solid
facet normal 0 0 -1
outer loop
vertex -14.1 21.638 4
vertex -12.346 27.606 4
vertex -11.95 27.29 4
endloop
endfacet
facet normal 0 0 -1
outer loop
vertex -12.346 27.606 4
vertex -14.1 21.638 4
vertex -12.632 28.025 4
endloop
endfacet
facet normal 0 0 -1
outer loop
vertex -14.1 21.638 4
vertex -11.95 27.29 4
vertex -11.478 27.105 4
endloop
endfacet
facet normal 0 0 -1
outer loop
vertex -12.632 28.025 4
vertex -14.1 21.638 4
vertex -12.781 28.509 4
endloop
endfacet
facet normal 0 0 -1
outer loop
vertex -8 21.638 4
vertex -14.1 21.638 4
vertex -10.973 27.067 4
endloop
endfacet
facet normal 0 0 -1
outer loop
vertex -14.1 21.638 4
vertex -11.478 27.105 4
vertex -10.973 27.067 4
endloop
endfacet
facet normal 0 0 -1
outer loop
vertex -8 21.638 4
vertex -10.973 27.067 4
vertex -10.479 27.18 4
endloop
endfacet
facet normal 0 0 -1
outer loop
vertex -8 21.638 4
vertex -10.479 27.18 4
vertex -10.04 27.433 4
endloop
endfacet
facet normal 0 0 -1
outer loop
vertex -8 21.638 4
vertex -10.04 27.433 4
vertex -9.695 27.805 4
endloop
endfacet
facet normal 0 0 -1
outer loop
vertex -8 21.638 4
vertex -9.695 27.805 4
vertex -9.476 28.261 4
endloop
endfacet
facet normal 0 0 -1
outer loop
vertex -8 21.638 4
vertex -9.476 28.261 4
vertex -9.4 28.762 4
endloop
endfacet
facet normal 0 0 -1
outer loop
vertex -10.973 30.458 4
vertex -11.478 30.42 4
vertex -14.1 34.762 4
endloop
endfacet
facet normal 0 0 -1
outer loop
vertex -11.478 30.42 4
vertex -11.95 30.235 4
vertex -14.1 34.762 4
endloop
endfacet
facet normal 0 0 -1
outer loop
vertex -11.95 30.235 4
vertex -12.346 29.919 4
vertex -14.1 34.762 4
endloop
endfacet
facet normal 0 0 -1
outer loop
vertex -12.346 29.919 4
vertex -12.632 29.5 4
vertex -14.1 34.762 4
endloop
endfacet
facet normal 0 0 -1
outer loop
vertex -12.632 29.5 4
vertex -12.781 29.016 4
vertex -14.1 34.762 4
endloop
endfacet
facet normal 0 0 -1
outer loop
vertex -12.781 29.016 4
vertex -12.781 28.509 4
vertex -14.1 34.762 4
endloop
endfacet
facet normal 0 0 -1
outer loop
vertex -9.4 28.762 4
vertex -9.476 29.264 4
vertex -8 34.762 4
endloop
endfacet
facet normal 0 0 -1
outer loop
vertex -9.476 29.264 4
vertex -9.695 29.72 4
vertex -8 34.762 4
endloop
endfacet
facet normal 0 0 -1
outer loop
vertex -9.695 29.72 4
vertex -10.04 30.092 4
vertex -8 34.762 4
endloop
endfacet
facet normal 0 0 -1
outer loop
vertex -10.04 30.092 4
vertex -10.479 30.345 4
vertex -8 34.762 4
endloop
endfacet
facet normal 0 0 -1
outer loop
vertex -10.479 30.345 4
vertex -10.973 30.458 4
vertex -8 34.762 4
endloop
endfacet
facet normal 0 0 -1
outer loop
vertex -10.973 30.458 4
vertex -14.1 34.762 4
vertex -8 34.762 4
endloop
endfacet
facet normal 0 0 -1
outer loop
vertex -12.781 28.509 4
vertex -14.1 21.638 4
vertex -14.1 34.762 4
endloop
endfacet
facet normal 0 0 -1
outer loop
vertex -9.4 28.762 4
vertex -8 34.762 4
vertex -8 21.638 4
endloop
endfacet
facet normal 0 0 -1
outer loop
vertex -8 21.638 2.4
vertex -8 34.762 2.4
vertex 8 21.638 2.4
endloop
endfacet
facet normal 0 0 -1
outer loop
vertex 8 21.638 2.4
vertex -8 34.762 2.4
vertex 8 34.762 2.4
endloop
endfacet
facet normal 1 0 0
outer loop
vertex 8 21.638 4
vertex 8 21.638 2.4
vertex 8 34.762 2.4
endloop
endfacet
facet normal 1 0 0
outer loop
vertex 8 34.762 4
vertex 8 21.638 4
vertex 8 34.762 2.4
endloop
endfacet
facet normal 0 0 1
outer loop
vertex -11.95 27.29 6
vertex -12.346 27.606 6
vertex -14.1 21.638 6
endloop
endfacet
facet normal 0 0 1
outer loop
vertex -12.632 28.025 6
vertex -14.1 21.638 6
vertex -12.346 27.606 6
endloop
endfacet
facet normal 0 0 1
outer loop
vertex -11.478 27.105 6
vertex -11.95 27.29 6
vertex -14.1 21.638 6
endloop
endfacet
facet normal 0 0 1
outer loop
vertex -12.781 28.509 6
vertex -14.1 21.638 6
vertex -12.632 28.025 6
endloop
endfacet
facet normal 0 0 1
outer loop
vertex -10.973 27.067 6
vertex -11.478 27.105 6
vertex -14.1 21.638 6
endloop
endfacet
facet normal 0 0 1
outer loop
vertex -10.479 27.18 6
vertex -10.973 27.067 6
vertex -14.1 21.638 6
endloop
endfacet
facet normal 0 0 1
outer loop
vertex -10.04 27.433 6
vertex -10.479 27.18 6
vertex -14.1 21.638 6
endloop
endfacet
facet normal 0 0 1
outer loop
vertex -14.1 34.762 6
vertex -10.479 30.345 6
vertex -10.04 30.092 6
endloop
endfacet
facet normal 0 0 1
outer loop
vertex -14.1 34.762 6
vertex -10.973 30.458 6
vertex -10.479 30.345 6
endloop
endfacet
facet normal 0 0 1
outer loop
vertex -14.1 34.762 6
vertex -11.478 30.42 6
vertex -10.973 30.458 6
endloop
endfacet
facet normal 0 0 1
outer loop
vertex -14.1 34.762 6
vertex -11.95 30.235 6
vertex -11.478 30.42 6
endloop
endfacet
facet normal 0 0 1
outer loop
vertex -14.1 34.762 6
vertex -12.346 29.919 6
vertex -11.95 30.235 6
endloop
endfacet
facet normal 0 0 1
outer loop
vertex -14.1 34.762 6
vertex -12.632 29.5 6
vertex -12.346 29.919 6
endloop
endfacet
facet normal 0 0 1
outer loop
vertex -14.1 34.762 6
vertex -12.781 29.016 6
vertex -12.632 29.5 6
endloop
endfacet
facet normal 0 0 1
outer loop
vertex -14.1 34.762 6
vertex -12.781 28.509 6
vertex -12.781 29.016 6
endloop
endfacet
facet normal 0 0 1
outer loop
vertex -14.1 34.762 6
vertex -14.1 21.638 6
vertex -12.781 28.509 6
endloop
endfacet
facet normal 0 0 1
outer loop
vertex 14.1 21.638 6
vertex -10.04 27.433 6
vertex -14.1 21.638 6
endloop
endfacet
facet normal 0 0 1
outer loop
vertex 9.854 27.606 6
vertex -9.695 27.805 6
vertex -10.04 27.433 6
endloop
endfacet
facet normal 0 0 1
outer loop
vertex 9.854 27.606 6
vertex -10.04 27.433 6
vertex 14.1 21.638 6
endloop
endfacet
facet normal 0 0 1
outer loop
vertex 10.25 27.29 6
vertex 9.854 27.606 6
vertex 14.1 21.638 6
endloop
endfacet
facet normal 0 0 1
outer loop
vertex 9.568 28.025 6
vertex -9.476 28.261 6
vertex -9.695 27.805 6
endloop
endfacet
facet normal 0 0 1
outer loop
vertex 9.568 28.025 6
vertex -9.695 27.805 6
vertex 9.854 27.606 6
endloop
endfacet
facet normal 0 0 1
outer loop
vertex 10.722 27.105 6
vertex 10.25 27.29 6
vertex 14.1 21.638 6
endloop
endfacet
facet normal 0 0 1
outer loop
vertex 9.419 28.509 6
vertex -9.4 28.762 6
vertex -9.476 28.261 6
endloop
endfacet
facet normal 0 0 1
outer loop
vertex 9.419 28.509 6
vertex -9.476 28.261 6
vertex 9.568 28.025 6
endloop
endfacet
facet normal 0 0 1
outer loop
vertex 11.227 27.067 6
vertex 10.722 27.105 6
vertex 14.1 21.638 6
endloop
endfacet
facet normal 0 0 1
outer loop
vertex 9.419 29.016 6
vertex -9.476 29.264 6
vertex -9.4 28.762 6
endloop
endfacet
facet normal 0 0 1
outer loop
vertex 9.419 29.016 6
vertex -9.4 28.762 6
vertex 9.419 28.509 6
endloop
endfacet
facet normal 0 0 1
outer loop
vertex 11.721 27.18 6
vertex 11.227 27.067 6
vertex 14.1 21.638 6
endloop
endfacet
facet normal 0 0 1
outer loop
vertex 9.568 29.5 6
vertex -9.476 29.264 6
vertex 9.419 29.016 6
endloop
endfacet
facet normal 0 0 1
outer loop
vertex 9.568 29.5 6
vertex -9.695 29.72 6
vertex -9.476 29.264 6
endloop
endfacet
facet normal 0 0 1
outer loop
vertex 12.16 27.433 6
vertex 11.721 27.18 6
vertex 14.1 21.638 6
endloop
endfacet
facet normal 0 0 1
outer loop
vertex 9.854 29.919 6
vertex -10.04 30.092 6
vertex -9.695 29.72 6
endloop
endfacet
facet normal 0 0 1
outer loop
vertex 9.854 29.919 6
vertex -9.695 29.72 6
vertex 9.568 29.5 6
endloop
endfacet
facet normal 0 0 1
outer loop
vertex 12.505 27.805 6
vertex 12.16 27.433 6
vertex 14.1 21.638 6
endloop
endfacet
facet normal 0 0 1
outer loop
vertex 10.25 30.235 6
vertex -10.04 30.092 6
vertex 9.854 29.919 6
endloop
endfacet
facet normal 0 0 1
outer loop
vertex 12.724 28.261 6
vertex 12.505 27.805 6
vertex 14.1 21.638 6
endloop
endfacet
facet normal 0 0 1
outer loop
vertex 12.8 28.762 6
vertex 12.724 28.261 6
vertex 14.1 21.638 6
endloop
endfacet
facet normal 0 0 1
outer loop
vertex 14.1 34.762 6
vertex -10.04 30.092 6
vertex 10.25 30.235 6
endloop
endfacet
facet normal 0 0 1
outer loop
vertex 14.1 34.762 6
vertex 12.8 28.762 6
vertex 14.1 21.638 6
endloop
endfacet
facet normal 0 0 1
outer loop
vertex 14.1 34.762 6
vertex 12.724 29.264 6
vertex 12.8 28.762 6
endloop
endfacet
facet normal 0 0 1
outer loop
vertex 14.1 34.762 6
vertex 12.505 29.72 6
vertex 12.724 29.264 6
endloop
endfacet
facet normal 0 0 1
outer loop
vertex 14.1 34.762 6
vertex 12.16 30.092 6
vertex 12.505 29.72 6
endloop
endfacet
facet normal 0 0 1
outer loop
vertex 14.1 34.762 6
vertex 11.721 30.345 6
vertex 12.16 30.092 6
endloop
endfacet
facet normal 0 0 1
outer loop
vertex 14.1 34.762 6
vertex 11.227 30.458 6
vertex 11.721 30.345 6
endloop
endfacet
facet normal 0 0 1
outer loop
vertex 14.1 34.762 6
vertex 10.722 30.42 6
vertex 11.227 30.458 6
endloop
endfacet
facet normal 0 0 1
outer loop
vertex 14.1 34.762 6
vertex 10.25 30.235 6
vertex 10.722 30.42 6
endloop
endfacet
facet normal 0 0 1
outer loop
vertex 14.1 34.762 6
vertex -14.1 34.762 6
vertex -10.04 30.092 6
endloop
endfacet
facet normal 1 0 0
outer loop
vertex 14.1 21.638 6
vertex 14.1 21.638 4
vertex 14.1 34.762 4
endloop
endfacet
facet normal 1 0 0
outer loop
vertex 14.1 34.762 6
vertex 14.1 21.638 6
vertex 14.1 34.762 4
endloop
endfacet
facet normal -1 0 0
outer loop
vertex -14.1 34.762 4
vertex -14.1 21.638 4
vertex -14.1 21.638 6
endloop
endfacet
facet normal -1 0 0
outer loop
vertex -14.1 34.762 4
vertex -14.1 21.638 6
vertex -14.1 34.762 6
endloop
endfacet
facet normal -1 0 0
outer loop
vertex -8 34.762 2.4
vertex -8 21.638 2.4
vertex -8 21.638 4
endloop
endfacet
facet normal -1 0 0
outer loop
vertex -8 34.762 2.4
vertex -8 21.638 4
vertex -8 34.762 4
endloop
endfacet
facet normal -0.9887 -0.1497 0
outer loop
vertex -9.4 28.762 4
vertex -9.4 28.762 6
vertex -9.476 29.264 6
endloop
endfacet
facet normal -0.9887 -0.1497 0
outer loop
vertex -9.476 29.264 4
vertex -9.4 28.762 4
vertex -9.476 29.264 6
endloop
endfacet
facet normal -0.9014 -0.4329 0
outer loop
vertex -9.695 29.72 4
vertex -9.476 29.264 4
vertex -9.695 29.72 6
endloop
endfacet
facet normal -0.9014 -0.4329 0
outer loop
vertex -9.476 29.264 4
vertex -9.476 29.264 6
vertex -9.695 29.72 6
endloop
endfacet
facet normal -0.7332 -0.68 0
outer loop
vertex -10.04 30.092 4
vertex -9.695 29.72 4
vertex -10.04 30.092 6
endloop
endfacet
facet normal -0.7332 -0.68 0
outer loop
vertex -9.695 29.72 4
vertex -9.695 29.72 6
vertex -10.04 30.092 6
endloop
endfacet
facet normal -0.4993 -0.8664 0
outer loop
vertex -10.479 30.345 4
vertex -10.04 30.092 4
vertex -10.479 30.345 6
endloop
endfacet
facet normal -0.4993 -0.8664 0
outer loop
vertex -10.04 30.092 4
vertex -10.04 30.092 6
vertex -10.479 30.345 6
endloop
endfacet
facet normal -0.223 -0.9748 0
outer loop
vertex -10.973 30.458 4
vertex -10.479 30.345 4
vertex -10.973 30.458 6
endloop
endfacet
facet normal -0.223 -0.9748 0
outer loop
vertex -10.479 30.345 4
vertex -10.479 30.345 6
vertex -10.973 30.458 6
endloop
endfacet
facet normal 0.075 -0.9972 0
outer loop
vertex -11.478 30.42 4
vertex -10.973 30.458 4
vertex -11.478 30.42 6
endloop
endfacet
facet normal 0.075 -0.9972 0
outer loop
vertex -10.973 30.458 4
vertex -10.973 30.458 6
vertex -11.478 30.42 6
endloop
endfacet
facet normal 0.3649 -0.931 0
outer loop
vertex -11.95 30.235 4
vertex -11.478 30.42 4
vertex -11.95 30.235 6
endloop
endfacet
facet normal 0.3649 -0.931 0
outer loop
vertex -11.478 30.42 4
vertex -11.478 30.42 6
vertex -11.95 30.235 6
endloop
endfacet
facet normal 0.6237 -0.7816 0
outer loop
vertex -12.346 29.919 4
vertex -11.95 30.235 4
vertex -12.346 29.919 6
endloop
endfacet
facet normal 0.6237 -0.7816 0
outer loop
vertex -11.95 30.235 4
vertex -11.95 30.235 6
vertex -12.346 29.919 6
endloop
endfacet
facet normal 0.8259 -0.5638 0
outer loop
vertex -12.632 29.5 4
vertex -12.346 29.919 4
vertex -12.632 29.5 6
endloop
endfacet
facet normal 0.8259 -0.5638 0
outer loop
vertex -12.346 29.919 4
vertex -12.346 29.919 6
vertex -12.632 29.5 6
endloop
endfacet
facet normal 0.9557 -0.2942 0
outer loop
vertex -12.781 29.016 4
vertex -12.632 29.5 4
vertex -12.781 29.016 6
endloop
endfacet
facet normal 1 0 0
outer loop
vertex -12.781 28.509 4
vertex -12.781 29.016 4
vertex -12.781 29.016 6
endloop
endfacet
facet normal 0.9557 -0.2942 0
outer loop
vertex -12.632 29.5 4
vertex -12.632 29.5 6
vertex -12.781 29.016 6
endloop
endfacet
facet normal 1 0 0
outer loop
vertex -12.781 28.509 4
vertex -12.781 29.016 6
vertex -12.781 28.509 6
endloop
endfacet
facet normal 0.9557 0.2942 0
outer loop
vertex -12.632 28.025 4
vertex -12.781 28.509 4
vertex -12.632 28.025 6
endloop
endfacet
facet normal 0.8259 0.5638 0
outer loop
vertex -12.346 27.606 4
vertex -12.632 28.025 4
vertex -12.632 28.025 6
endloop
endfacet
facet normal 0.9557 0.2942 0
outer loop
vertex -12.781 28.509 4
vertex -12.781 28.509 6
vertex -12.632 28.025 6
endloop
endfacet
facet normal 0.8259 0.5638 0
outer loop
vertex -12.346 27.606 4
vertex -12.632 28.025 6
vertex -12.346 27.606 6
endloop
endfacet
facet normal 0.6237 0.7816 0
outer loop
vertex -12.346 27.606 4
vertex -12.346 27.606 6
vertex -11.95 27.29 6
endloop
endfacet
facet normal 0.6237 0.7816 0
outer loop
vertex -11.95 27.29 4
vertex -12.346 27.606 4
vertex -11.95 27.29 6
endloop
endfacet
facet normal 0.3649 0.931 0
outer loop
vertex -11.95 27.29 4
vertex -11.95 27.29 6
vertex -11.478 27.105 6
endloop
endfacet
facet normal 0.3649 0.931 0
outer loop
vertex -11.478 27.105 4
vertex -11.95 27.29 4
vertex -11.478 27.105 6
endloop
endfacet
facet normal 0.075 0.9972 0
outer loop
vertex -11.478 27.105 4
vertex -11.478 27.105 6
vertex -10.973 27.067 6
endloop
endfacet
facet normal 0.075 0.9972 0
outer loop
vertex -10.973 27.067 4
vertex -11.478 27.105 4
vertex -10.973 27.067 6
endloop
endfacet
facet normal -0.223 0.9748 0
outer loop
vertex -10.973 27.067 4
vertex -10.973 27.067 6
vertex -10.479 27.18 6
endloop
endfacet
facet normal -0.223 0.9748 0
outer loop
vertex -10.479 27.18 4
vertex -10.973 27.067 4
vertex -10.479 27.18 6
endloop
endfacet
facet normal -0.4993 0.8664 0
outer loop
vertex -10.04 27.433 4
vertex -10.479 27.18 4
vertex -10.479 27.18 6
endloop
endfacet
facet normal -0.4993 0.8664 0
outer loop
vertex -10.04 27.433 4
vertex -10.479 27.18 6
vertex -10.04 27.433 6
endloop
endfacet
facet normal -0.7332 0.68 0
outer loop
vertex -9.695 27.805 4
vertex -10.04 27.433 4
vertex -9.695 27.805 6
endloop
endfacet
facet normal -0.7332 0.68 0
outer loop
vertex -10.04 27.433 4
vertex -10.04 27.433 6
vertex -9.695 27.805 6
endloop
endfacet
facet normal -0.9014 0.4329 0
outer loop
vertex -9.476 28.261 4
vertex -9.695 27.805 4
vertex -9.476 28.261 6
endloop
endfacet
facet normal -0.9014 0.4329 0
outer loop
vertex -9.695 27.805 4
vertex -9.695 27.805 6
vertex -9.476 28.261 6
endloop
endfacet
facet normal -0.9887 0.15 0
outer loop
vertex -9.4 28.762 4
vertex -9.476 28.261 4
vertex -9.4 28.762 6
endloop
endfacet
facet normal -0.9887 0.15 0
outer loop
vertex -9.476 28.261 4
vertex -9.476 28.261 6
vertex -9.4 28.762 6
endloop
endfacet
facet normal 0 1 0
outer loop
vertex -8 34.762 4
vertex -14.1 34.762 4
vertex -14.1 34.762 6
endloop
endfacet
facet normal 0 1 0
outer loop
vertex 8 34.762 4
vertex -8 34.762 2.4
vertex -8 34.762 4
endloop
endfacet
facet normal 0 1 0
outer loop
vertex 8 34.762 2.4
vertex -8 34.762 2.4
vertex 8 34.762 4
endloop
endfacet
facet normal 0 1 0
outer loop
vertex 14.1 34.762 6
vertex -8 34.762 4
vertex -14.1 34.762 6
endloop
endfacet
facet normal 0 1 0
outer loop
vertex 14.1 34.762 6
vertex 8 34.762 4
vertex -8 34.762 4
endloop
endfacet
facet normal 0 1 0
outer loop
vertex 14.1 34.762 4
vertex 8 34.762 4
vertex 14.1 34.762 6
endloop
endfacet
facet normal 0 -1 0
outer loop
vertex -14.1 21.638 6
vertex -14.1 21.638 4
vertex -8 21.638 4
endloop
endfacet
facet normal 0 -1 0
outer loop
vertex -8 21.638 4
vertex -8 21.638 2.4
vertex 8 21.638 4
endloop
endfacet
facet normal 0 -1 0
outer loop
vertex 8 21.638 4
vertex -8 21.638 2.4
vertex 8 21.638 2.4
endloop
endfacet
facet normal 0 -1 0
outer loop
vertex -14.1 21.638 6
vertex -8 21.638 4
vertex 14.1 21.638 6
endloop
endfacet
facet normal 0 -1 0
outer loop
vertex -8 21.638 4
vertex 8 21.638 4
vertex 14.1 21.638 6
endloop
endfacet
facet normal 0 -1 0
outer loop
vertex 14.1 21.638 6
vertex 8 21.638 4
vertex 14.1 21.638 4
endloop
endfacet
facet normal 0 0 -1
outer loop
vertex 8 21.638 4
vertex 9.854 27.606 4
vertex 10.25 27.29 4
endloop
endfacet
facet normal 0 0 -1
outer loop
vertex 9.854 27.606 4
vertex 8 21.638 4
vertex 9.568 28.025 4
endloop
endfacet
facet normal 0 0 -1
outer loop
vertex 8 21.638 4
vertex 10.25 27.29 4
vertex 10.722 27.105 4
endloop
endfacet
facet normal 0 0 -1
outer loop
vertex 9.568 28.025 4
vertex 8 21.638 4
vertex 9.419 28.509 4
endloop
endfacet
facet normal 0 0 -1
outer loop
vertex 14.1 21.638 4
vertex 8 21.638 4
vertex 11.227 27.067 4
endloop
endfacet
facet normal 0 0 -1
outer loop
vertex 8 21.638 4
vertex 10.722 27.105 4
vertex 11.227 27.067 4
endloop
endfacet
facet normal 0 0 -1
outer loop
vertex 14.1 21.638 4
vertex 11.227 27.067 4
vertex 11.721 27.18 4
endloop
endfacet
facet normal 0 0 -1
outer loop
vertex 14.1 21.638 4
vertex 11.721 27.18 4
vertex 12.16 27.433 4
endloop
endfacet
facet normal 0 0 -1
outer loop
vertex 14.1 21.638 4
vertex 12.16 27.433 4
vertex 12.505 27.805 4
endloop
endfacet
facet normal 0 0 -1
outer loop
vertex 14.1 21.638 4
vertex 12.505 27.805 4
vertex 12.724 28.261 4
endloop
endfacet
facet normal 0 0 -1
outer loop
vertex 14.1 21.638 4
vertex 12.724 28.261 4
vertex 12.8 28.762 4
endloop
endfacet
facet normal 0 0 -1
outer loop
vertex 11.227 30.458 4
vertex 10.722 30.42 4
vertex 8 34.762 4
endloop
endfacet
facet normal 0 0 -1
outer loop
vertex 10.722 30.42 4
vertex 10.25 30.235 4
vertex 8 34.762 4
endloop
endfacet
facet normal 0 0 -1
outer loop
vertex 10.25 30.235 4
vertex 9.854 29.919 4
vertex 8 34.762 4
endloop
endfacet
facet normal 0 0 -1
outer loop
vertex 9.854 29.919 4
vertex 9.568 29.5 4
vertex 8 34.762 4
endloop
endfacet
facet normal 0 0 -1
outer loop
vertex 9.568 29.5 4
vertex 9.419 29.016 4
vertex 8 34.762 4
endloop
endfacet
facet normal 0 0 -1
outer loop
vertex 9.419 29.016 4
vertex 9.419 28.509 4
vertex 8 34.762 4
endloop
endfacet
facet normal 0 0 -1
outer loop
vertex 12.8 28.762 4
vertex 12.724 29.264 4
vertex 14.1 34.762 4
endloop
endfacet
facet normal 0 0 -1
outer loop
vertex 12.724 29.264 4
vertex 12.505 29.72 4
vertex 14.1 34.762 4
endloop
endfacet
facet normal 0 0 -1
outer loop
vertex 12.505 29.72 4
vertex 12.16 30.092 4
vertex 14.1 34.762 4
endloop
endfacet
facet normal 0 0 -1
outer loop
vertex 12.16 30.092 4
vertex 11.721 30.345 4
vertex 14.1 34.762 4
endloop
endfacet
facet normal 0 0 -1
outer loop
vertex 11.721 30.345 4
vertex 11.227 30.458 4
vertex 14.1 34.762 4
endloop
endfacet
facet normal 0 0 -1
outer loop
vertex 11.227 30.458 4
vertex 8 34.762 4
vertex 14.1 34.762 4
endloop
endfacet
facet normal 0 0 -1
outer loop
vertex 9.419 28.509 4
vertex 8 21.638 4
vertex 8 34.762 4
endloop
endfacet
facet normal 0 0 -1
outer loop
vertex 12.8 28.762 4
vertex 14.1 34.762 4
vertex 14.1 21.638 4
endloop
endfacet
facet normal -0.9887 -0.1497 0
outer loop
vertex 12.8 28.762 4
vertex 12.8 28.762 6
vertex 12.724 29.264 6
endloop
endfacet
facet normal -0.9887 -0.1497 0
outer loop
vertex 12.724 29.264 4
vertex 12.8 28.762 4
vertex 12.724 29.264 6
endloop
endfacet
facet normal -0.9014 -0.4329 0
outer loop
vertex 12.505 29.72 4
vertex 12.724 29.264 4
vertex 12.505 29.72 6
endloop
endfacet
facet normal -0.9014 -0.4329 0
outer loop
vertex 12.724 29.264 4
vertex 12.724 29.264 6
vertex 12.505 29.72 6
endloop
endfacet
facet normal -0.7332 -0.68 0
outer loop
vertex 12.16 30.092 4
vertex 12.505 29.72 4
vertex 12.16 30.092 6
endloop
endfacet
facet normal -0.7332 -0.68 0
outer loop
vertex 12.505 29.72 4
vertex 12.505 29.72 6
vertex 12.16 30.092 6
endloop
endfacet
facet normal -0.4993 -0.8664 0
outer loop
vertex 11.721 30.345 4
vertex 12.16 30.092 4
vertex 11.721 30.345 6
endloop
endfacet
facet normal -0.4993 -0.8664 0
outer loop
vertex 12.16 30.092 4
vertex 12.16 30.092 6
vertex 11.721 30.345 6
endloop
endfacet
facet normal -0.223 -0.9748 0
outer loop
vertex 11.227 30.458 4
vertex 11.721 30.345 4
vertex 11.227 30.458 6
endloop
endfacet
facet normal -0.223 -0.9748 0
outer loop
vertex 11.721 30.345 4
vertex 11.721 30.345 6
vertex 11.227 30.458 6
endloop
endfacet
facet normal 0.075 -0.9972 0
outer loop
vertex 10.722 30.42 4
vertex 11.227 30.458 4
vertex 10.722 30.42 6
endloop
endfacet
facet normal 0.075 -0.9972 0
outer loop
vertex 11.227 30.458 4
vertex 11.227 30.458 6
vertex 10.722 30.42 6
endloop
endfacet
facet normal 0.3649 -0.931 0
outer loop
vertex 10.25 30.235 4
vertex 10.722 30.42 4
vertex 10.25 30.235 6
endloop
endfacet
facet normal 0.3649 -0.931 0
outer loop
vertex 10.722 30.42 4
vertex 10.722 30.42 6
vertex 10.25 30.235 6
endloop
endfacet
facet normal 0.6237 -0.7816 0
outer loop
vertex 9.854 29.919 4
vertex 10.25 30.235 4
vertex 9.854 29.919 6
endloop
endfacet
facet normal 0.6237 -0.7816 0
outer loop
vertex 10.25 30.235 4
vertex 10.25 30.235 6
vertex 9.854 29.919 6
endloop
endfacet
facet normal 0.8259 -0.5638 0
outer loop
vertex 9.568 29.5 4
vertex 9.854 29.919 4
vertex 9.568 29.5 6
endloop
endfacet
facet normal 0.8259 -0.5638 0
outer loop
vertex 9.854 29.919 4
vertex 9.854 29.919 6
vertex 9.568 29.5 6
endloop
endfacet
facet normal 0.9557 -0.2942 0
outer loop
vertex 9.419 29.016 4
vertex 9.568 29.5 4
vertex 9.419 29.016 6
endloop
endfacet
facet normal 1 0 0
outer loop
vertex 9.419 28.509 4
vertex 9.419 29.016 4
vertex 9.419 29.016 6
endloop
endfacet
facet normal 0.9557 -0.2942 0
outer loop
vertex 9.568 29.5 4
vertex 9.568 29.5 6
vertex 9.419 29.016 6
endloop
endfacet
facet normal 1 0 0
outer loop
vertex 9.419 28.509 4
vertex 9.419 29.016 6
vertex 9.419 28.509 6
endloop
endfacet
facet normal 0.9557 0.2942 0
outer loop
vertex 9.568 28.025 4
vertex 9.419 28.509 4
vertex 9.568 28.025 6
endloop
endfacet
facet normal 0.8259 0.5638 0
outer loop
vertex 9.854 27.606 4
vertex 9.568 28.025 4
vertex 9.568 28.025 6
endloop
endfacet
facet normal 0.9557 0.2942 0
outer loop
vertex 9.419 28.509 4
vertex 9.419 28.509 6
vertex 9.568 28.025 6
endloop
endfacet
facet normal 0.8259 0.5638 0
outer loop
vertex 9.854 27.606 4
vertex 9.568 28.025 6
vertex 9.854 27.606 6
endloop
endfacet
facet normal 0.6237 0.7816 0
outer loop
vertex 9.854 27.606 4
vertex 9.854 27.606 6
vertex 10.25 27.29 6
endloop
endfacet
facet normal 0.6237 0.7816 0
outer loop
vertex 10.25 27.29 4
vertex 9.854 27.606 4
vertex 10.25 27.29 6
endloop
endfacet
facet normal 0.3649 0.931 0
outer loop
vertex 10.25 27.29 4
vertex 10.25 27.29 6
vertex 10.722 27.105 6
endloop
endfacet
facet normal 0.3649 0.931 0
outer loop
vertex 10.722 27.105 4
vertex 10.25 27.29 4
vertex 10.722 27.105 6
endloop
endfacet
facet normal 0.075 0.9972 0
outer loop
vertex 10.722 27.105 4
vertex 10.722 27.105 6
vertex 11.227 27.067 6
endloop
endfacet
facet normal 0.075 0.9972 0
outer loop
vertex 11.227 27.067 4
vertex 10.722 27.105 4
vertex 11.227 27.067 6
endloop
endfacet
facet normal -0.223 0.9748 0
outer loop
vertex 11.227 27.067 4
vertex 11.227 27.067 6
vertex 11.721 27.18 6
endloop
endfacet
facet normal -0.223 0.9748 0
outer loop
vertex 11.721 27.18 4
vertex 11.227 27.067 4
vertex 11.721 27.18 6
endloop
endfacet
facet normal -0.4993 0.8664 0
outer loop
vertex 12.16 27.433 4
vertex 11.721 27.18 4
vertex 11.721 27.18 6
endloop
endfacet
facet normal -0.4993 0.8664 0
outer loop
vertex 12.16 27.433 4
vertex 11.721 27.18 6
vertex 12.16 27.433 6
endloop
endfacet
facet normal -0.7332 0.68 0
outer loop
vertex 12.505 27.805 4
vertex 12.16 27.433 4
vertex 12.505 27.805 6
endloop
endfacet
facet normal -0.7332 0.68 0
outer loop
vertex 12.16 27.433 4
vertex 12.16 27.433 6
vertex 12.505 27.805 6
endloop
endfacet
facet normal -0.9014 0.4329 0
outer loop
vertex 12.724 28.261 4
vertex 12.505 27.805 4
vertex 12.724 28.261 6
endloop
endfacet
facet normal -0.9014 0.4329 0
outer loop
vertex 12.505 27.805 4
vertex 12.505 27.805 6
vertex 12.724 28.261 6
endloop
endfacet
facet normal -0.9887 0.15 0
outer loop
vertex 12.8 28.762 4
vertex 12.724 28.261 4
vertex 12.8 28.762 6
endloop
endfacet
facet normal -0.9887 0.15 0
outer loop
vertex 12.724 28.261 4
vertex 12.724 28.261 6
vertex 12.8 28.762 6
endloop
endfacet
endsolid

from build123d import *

# Parameters (mm, degrees)
SKETCH018_W     = 16
SKETCH018_H     = 13.125
PAD006_DEPTH    = 1.6
SKETCH019_W     = 28.2
SKETCH019_H     = 13.125
PAD007_DEPTH    = 2
SKETCH020_R     = 1.7
POCKET007_DEPTH = 2


with BuildPart() as part:
    # Sketch018 → Pad006 (new body)
    with BuildSketch(Plane.XY):
        with Locations((0, 28.2)):
            Rectangle(SKETCH018_W, SKETCH018_H)
    extrude(amount=PAD006_DEPTH)

    # Sketch019 (on Face6 of Pad006) → Pad007 (join)
    with BuildSketch(Plane.XY.offset(1.6)):
        with Locations((0, 28.2)):
            Rectangle(SKETCH019_W, SKETCH019_H)
    extrude(amount=PAD007_DEPTH)

    # Sketch020 (on Face7 of Pad007) → Pocket007 (cut)
    with BuildSketch(Plane.XY.offset(3.6)):
        with Locations((-11.1, 28.7625)):
            Circle(SKETCH020_R)
        with Locations((11.1, 28.7625)):
            Circle(SKETCH020_R)
    extrude(amount=-POCKET007_DEPTH, mode=Mode.SUBTRACT)


with BuildPart() as part_1:
    # Body003 placement: moved
    add(part.part.moved(Location((0, 0, 2.4))))


solid = part_1.part
